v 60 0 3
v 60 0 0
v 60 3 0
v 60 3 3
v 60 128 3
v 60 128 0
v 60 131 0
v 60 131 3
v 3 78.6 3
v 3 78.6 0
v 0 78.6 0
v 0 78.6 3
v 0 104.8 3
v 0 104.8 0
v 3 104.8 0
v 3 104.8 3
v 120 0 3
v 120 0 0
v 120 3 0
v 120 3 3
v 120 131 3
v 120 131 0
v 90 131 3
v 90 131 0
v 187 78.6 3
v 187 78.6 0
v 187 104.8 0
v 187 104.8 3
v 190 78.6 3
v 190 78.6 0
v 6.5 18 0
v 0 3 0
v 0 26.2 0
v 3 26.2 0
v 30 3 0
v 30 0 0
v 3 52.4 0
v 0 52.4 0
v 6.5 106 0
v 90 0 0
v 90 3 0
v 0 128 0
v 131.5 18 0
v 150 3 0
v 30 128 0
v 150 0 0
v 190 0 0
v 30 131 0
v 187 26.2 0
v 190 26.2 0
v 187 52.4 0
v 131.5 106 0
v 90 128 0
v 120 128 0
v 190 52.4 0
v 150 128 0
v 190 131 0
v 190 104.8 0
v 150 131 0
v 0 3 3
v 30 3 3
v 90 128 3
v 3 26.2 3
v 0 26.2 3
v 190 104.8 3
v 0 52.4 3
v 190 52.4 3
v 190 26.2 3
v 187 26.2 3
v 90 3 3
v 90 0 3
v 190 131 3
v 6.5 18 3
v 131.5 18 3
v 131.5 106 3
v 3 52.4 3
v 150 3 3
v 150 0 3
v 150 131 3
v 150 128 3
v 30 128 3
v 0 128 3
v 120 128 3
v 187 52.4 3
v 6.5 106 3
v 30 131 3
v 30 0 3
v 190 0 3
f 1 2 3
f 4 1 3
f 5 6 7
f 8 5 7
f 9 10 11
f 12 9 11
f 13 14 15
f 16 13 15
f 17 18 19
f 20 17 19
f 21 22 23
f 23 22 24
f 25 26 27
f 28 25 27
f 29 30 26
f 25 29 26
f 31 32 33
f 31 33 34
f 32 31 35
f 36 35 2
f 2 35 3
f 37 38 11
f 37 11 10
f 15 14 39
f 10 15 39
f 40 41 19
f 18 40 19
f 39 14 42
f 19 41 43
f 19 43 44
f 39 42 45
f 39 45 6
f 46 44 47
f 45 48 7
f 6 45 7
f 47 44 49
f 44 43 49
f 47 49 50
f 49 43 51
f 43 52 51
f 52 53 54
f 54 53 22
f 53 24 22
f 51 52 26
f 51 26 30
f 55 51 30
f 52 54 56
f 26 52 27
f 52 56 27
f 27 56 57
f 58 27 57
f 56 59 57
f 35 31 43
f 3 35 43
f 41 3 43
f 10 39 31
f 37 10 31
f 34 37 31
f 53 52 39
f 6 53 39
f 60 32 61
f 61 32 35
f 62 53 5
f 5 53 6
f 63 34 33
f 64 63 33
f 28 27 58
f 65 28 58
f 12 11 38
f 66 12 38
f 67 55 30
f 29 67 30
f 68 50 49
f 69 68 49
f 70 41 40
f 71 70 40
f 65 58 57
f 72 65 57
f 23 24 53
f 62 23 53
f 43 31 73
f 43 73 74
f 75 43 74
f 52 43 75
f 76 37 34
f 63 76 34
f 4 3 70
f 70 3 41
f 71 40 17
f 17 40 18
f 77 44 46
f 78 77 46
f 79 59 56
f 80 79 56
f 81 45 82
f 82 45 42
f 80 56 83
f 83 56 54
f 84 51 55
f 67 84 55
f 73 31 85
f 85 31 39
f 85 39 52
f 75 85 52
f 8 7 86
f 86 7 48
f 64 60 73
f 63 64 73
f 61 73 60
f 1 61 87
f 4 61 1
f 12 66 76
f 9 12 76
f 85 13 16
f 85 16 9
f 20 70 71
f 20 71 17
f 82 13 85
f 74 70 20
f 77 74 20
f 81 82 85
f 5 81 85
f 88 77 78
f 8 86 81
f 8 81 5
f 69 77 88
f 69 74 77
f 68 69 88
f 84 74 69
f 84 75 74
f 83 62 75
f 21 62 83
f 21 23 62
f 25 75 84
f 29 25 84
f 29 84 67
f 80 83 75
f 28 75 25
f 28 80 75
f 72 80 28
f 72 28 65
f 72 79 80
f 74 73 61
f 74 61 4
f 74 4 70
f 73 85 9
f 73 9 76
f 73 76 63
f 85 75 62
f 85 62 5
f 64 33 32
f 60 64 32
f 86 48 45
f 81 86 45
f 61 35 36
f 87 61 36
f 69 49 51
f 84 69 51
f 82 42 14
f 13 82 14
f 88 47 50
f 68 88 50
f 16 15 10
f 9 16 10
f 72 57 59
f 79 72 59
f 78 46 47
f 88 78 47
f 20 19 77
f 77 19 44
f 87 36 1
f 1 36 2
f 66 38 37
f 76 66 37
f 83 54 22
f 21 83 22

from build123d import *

# Parameters (mm, degrees)
SKETCH1_W           = 125
SKETCH1_H           = 88
BOSS_EXTRUDE1_DEPTH = 3


with BuildPart() as part:
    # Sketch1 → Boss-Extrude1 (new body)
    with BuildSketch(Plane.XY):
        Polygon((60, 128), (60, 131), (30, 131), (30, 128), (0, 128), (0, 104.8), (3, 104.8), (3, 78.6), (0, 78.6), (0, 52.4), (3, 52.4), (3, 26.2), (0, 26.2), (0, 3), (30, 3), (30, 0), (60, 0), (60, 3), (90, 3), (90, 0), (120, 0), (120, 3), (150, 3), (150, 0), (190, 0), (190, 26.2), (187, 26.2), (187, 52.4), (190, 52.4), (190, 78.6), (187, 78.6), (187, 104.8), (190, 104.8), (190, 131), (150, 131), (150, 128), (120, 128), (120, 131), (90, 131), (90, 128), align=None)
        with Locations((69, 62)):
            Rectangle(SKETCH1_W, SKETCH1_H, mode=Mode.SUBTRACT)
    extrude(amount=BOSS_EXTRUDE1_DEPTH)


solid = part.part
